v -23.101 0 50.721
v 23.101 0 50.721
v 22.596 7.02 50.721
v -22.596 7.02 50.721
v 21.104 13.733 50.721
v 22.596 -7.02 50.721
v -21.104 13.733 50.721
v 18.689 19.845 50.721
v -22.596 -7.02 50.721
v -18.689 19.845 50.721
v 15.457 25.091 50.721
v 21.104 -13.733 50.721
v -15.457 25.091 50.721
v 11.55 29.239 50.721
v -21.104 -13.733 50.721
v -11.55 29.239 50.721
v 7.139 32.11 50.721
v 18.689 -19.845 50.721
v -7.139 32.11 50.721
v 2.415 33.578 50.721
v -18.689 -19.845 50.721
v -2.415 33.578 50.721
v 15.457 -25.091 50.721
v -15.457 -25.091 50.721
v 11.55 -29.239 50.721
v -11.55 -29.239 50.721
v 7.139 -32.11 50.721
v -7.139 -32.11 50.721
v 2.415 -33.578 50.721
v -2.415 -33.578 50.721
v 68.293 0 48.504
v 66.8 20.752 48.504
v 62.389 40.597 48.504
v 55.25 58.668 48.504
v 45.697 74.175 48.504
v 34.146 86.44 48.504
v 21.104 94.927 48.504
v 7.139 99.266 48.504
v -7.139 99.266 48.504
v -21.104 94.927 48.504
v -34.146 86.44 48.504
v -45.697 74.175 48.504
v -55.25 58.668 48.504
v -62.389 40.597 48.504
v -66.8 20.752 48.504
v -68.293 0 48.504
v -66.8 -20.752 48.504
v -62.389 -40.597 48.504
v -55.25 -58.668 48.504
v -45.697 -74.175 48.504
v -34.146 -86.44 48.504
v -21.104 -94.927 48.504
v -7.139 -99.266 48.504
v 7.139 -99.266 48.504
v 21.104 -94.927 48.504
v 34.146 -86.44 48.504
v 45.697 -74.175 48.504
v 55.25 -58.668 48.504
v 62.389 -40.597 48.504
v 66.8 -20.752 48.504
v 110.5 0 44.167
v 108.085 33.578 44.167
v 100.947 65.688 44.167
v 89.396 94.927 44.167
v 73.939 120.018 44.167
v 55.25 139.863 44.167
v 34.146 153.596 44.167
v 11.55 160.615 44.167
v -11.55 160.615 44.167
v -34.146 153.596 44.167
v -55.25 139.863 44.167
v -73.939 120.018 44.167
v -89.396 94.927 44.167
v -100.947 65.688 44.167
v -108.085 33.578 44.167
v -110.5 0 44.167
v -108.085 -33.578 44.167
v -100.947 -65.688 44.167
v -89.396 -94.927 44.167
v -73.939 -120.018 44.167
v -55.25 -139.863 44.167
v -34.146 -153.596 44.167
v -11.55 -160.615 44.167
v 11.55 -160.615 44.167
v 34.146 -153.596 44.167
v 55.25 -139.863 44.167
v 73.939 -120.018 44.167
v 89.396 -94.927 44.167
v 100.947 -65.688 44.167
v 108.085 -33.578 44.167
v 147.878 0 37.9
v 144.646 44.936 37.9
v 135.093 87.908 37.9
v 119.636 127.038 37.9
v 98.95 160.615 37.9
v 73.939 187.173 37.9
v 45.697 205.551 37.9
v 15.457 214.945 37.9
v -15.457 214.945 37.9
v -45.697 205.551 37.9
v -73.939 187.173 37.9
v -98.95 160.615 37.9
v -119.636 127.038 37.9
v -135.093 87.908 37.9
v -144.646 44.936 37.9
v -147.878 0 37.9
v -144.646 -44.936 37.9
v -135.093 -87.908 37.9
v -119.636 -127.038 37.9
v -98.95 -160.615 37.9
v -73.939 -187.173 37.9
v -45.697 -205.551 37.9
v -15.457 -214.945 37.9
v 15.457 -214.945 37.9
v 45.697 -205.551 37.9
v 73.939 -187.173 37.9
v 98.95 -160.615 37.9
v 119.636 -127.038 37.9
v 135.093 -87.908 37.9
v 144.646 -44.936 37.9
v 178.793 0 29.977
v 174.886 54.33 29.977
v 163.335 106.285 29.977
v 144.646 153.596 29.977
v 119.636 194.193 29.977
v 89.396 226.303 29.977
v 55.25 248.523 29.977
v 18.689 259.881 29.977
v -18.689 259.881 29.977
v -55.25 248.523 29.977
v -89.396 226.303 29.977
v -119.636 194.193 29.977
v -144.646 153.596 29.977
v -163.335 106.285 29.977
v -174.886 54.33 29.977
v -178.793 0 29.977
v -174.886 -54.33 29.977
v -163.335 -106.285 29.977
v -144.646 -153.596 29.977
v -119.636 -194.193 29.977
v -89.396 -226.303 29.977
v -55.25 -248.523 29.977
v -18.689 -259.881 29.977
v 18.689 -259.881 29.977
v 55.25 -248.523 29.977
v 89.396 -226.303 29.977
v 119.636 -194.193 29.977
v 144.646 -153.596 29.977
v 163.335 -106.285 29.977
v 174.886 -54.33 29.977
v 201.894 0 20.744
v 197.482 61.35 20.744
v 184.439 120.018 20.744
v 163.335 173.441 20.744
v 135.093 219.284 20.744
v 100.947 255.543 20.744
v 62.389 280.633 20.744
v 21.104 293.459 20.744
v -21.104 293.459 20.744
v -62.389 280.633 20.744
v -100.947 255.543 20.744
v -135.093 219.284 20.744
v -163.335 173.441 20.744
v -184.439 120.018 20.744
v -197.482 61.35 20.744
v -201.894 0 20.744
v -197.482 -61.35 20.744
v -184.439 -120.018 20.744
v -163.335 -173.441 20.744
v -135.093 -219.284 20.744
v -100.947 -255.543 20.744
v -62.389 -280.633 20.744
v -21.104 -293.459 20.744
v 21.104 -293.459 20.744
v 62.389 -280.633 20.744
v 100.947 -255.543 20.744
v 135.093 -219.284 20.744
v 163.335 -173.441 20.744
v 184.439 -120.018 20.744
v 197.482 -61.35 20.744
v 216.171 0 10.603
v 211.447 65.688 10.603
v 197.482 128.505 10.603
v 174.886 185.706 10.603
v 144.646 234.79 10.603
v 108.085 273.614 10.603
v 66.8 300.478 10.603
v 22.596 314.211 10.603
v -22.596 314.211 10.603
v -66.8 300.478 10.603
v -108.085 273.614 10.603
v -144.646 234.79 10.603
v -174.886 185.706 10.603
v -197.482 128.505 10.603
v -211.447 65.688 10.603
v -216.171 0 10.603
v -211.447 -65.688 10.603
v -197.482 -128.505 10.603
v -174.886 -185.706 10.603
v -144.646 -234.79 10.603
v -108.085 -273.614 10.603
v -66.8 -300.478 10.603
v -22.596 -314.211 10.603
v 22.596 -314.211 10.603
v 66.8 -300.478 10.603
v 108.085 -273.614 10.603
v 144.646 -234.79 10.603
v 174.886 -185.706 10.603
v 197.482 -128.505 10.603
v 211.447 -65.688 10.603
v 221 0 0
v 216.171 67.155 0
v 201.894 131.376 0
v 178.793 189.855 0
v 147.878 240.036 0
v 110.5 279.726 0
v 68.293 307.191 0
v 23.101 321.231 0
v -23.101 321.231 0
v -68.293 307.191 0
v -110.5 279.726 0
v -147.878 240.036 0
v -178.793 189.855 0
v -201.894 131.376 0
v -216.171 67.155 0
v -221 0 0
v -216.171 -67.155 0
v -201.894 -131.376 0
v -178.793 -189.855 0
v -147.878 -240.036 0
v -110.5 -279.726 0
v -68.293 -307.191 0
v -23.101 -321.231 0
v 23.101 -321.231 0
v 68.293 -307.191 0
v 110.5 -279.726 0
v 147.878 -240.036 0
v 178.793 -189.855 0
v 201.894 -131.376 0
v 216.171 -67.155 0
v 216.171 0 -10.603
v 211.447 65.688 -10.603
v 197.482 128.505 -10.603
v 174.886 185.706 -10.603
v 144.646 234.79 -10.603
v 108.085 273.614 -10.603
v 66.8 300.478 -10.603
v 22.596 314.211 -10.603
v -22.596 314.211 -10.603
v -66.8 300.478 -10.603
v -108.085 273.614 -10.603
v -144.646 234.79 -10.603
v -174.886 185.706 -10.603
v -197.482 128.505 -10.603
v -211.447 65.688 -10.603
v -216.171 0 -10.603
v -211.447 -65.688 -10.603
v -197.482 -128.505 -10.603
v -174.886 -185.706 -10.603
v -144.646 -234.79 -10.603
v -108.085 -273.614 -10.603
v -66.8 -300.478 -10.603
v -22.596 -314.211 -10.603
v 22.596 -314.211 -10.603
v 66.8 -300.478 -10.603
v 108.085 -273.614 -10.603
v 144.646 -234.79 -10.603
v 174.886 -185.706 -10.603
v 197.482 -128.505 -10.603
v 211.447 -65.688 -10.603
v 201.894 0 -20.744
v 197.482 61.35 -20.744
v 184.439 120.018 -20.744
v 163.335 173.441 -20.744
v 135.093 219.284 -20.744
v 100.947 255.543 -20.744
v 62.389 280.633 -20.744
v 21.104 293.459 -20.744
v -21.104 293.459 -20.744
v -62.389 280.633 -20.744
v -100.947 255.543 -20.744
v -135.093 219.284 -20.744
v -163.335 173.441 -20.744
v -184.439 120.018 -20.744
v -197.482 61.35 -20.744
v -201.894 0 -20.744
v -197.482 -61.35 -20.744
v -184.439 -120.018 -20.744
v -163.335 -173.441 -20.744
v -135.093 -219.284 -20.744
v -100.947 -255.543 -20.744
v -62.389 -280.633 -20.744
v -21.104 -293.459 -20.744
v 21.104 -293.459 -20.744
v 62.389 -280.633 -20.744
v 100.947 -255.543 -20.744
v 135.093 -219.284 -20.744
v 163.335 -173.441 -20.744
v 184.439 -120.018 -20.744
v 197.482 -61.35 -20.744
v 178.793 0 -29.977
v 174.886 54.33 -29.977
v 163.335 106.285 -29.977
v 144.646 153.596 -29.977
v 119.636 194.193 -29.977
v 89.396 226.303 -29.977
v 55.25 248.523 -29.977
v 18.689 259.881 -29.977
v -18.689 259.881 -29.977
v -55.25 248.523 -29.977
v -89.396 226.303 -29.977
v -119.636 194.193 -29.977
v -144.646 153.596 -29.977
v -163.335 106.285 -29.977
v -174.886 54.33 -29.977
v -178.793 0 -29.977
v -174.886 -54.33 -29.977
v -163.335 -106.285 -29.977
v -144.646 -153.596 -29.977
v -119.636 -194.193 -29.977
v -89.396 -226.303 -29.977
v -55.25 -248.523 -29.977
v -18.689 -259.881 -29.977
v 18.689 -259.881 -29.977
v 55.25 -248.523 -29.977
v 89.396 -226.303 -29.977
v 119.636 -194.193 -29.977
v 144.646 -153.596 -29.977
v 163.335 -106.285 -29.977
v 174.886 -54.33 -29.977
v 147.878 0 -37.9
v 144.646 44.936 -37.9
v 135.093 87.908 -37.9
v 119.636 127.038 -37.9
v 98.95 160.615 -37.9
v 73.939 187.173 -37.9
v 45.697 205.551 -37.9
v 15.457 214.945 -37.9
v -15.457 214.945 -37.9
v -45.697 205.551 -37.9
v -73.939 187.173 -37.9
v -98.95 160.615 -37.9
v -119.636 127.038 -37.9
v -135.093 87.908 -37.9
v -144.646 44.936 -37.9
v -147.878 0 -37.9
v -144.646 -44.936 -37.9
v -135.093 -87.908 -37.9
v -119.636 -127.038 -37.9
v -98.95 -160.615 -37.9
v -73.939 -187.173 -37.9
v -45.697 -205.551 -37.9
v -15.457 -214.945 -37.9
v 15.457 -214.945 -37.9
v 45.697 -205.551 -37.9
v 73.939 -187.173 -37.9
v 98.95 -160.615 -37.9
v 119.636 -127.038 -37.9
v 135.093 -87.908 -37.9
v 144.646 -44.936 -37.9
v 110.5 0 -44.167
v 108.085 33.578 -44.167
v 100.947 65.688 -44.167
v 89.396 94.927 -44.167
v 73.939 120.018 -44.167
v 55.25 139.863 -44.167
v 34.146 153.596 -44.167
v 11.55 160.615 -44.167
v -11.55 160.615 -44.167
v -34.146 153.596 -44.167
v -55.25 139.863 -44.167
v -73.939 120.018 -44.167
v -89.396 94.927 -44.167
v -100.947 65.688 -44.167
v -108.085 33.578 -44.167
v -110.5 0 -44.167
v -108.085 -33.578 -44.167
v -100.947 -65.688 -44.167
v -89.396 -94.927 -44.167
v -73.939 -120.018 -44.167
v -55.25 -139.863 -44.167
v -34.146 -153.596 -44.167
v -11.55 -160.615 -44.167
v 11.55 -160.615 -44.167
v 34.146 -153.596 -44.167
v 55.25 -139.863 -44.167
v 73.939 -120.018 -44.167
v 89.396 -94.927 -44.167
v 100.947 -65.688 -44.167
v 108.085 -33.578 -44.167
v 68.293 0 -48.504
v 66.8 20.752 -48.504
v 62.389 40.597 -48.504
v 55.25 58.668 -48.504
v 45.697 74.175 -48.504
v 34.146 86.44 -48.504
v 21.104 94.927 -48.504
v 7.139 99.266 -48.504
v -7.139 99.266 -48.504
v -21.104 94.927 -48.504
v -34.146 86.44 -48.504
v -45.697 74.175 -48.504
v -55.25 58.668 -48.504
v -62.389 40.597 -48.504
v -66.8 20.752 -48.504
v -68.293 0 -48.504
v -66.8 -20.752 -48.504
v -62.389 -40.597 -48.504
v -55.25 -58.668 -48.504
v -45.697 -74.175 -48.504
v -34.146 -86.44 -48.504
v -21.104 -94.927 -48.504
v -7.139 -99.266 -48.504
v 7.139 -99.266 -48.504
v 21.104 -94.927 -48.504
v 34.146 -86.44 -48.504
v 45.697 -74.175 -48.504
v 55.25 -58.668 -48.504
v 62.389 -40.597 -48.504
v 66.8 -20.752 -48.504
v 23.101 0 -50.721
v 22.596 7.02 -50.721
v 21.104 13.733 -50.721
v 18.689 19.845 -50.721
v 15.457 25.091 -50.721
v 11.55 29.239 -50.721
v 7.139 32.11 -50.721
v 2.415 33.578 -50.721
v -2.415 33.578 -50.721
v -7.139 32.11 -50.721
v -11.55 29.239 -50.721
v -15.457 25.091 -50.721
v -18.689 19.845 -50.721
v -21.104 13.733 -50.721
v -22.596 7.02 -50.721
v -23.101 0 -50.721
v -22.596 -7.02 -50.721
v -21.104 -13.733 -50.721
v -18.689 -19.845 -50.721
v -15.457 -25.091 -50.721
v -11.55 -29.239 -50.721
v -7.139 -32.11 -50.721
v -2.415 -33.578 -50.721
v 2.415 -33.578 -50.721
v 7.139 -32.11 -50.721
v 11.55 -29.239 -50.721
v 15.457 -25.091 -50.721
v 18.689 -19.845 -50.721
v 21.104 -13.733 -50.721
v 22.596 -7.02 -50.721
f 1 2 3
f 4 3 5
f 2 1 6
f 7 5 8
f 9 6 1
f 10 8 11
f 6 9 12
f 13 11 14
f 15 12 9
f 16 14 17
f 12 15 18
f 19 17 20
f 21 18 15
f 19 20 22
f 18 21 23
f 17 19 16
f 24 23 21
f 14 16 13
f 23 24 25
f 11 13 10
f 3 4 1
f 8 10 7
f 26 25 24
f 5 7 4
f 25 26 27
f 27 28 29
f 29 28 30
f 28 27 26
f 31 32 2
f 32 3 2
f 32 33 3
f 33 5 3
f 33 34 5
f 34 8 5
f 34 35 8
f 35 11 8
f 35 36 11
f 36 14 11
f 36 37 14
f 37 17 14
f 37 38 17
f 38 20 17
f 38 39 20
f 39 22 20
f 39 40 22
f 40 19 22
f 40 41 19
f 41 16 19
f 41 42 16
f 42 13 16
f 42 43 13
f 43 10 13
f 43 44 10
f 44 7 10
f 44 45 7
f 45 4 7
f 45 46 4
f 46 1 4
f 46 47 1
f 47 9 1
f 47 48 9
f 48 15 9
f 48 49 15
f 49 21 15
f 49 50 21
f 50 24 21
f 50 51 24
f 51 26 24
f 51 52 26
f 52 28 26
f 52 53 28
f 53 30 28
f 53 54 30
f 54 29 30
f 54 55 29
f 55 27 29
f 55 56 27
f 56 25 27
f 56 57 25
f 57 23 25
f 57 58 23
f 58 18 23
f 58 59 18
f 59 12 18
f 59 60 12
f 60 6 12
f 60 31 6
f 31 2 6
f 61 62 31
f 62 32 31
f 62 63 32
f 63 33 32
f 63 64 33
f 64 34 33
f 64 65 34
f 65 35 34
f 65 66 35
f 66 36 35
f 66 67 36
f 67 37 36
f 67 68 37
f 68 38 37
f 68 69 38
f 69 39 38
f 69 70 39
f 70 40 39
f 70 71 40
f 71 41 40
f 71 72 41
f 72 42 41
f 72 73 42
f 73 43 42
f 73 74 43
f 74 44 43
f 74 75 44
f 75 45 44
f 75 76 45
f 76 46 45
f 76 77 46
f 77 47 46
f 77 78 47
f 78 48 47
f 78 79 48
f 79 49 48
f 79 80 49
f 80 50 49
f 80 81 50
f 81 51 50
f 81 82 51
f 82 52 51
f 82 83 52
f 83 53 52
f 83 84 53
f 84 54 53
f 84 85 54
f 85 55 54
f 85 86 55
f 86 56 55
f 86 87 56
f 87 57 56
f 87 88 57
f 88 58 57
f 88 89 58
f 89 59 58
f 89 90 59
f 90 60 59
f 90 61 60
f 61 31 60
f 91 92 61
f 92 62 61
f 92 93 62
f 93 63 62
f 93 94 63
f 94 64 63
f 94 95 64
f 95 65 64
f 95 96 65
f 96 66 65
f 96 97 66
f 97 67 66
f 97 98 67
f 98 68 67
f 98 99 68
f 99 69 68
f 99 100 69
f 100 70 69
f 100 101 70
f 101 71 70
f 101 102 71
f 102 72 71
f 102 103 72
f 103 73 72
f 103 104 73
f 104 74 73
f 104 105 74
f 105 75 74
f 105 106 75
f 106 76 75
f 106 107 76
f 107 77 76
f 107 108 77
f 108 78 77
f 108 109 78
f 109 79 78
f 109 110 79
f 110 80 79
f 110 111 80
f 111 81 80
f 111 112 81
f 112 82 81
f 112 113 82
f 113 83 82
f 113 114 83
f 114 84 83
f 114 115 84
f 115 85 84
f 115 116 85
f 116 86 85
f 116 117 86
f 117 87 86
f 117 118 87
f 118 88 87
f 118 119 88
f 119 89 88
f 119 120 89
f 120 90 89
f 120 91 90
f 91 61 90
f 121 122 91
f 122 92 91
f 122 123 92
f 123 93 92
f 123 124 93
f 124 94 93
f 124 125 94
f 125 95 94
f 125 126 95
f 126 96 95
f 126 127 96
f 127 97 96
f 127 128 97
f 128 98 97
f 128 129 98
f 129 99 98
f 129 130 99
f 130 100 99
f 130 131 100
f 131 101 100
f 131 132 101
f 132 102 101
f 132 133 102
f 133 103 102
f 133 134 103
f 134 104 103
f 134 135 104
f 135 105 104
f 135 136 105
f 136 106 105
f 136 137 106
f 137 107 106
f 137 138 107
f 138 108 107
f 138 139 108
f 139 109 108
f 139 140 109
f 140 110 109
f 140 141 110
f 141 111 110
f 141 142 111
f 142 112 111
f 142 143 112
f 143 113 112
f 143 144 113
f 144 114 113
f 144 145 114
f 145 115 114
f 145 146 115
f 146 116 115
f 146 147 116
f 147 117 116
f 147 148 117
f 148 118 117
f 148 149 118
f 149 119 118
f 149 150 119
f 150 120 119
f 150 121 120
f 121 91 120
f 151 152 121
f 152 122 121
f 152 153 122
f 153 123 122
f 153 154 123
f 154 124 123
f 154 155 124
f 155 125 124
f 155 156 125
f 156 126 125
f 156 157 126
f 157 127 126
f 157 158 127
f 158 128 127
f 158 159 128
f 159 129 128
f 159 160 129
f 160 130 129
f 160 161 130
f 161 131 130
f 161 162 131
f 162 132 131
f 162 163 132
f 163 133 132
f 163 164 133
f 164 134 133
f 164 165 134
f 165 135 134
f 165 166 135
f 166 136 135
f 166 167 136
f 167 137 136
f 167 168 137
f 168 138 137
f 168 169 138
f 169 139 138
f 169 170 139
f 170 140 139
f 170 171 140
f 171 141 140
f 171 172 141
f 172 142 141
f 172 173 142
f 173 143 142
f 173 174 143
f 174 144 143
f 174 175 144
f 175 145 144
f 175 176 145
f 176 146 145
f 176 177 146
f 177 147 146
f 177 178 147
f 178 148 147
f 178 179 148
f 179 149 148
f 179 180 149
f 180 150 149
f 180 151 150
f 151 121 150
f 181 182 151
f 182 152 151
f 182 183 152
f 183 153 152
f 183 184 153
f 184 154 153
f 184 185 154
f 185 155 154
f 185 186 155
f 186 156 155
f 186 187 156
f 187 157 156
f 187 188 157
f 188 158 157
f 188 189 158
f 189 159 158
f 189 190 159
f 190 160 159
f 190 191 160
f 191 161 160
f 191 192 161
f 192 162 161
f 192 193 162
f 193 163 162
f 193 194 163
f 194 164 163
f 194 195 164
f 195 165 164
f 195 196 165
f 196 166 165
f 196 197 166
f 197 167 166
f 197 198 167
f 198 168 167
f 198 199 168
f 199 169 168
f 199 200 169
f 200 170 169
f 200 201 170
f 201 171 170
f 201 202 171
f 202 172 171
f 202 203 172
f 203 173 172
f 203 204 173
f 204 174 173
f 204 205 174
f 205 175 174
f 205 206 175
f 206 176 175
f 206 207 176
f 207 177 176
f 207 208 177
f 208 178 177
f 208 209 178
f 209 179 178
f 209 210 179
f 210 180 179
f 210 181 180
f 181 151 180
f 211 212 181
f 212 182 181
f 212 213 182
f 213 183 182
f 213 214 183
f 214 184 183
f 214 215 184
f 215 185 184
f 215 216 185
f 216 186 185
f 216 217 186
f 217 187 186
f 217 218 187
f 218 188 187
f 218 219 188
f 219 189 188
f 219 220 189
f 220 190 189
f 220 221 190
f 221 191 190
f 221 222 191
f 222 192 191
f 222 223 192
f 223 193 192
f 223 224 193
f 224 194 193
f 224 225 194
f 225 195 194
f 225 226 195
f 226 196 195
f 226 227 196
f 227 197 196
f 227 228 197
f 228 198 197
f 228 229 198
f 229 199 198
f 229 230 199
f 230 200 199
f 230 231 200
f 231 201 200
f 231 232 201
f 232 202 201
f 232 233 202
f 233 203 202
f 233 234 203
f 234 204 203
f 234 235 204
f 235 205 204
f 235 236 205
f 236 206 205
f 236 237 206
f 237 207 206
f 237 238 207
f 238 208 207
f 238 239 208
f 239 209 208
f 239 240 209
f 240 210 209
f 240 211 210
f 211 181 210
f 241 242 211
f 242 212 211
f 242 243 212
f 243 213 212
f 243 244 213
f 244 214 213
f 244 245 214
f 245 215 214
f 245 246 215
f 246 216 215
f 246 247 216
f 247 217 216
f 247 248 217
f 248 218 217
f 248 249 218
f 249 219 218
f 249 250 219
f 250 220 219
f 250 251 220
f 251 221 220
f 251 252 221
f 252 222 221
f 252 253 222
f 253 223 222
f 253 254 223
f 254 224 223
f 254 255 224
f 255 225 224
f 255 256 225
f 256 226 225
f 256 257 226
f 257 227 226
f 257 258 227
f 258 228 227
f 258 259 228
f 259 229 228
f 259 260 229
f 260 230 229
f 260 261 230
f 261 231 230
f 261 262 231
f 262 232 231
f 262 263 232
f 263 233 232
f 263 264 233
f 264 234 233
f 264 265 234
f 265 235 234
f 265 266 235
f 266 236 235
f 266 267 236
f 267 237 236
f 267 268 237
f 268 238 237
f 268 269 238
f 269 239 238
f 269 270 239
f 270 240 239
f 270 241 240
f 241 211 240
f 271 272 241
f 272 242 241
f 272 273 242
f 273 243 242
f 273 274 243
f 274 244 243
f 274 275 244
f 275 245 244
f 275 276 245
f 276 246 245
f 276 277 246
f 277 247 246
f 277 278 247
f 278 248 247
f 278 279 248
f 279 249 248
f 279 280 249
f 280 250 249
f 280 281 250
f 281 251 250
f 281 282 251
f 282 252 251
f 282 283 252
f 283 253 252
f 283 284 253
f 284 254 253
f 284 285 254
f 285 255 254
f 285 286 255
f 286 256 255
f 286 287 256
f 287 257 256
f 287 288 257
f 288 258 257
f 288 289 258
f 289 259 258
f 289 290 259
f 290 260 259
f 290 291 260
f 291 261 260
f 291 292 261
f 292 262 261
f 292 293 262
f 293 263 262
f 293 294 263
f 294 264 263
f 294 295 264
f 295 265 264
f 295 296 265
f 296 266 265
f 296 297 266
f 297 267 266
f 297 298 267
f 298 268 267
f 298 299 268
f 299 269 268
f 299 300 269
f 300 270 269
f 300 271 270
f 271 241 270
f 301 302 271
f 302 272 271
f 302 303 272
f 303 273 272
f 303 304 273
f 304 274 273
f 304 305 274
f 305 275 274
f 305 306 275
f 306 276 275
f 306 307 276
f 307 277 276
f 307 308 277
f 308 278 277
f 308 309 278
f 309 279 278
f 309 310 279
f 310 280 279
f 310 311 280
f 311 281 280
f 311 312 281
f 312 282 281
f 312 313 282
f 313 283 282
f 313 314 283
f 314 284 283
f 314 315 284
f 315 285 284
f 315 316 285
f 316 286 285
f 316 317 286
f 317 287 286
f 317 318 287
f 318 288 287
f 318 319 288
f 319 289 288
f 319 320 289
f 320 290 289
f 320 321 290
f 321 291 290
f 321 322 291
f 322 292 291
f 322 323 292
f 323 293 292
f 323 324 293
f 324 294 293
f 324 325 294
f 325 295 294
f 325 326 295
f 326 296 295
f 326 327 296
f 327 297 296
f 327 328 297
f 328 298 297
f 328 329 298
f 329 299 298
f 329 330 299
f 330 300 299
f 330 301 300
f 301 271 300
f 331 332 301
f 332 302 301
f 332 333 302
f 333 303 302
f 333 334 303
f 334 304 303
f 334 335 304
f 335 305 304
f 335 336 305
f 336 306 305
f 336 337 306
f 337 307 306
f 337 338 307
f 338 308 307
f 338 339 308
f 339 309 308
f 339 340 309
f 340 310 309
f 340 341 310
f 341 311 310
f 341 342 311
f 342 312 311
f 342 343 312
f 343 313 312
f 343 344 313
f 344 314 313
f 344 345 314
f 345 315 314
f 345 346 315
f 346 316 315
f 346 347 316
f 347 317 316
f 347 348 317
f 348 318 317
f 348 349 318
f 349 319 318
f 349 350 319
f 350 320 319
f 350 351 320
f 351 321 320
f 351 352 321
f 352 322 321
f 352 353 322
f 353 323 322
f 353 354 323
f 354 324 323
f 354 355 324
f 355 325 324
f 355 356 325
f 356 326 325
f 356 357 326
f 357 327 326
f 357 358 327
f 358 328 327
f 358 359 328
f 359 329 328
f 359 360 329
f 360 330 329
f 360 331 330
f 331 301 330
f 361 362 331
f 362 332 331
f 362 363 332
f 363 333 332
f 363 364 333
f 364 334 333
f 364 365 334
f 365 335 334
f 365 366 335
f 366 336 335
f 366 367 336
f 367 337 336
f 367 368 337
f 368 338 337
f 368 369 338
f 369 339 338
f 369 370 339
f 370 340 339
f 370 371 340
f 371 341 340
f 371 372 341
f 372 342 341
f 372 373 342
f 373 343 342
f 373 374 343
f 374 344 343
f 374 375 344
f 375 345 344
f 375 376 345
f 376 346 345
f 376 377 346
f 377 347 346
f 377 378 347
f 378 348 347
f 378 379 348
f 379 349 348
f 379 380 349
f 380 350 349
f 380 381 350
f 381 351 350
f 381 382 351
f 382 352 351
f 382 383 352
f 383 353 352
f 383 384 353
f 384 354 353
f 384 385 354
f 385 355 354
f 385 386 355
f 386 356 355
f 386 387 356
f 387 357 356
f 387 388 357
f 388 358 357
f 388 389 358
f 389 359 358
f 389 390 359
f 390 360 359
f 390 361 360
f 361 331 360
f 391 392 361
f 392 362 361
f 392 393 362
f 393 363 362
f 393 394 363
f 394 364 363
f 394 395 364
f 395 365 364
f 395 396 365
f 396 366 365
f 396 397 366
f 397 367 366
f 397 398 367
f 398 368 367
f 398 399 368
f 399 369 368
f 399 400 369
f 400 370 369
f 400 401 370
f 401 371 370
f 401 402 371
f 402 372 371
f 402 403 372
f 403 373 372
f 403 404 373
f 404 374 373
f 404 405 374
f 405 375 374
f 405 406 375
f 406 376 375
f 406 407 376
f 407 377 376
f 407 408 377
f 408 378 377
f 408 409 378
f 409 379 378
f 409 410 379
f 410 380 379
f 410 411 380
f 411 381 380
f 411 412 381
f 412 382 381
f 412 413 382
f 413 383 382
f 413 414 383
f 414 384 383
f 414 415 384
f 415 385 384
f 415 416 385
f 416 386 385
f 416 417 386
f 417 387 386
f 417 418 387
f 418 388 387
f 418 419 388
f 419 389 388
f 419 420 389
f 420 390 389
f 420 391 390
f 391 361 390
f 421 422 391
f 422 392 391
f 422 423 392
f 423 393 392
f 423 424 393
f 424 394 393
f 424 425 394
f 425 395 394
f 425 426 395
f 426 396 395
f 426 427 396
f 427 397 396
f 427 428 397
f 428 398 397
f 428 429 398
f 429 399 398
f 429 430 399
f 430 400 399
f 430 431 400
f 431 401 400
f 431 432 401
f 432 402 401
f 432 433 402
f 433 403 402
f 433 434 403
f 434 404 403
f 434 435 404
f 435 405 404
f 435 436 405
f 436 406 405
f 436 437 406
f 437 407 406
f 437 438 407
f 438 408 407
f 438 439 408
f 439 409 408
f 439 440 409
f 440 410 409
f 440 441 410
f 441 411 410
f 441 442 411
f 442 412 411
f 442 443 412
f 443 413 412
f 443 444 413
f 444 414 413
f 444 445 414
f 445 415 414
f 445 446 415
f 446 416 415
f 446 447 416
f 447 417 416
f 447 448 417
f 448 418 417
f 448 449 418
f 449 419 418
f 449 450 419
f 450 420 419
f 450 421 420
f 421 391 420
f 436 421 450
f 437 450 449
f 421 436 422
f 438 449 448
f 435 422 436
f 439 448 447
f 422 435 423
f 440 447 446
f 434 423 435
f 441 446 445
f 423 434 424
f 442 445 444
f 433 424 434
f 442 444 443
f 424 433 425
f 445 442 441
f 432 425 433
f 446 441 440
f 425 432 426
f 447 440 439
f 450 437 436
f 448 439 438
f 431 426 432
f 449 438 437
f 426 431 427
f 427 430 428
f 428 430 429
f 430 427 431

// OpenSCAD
// Generated by SolidPython 1.0.1 on 2020-07-29 00:46:51


scale(v = [13, 19, 3]) {
	sphere(r = 17);
}
/***********************************************
*********      SolidPython code:      **********
************************************************
 
# import packages: SolidPython
from solid import *
from solid.utils import *
from itertools import chain, combinations, permutations


class Resize:

    def __init__(self, scad_file):
        self.scad_file = scad_file
        #self.scad_file = import_scad(scad_file)
        # cone/cylinder param:
        self.r1 = 0
        self.r2 = 0
        self.h = 0
        # rectangular prism param:
        self.w = 0
        self.l = 0
        # ellipse param:
        self.r = 0

    # import OpenScad code (file name corresponds to shape)


    # classify shape + parameters
    def assign(self, param1, param2, param3):
        if self.scad_file == 'cone.scad':
            self.r1 = param1
            self.r2 = param2
            self.h = param3
        elif self.scad_file == 'cylinder.scad':
            self.r1 = param1
            self.r2 = param2
            self.h = param3
        elif self.scad_file == 'rectangularPrism.scad':
            self.h = param1
            self.l = param2
            self.w = param3
        else:
            self.r = param1
            self.h = param2

    # resize parameters
    def iterate(self):
        x = range(3, 20, 2)
        i = 1
        if self.scad_file == 'cone.scad':
            tempList = list(permutations(x, 2))
            for temp in tempList:
                param1 = temp[0]
                param2 = temp[1]
                filepath = 'produced_scad_files/' + 'cone' + str(param1) + '_' + str(param2) + '_' + '.scad'
                scad_render_to_file(cylinder(h=param1, r1=param2, r2=0), filepath)

        elif self.scad_file == 'cylinder.scad':
            tempList = list(permutations(x, 3))
            for temp in tempList:
                param1 = temp[0]
                param2 = temp[1]
                filepath = 'produced_scad_files/' + 'cylinder' + str(param1) + '_' + str(param2) + '_' + '.scad'
                scad_render_to_file(cylinder(h=param1, r1=param2, r2=param2), filepath)

        elif self.scad_file == 'rectangularPrism.scad':
            tempList = list(permutations(x, 3))
            for temp in tempList:
                param1 = temp[0]
                param2 = temp[1]
                param3 = temp[2]
                filepath = 'produced_scad_files/' + 'rectangularPrism' + str(param1) + '_' + str(param2) + '_' + str(
                    param3) + '.scad'
                scad_render_to_file(cube(size=(param1, param2, param3)), filepath)

        elif self.scad_file == 'ellipse.scad':
            tempList = list(permutations(x, 4))
            for temp in tempList:
                param1 = temp[0]
                param2 = temp[1]
                param3 = temp[2]
                param4 = temp[3]
                filepath = 'produced_scad_files/' + 'ellipse' + str(param1) + '_' + str(param2) + '_' + str(param3) + '_' + str(param4) + '.scad'
                scad_render_to_file(scale([param1, param2, param3])(sphere(r=param4)), filepath)

    def render_to_scadfile(self):
        scad_render_to_file(scad, 'example.scad') 
 
************************************************/
